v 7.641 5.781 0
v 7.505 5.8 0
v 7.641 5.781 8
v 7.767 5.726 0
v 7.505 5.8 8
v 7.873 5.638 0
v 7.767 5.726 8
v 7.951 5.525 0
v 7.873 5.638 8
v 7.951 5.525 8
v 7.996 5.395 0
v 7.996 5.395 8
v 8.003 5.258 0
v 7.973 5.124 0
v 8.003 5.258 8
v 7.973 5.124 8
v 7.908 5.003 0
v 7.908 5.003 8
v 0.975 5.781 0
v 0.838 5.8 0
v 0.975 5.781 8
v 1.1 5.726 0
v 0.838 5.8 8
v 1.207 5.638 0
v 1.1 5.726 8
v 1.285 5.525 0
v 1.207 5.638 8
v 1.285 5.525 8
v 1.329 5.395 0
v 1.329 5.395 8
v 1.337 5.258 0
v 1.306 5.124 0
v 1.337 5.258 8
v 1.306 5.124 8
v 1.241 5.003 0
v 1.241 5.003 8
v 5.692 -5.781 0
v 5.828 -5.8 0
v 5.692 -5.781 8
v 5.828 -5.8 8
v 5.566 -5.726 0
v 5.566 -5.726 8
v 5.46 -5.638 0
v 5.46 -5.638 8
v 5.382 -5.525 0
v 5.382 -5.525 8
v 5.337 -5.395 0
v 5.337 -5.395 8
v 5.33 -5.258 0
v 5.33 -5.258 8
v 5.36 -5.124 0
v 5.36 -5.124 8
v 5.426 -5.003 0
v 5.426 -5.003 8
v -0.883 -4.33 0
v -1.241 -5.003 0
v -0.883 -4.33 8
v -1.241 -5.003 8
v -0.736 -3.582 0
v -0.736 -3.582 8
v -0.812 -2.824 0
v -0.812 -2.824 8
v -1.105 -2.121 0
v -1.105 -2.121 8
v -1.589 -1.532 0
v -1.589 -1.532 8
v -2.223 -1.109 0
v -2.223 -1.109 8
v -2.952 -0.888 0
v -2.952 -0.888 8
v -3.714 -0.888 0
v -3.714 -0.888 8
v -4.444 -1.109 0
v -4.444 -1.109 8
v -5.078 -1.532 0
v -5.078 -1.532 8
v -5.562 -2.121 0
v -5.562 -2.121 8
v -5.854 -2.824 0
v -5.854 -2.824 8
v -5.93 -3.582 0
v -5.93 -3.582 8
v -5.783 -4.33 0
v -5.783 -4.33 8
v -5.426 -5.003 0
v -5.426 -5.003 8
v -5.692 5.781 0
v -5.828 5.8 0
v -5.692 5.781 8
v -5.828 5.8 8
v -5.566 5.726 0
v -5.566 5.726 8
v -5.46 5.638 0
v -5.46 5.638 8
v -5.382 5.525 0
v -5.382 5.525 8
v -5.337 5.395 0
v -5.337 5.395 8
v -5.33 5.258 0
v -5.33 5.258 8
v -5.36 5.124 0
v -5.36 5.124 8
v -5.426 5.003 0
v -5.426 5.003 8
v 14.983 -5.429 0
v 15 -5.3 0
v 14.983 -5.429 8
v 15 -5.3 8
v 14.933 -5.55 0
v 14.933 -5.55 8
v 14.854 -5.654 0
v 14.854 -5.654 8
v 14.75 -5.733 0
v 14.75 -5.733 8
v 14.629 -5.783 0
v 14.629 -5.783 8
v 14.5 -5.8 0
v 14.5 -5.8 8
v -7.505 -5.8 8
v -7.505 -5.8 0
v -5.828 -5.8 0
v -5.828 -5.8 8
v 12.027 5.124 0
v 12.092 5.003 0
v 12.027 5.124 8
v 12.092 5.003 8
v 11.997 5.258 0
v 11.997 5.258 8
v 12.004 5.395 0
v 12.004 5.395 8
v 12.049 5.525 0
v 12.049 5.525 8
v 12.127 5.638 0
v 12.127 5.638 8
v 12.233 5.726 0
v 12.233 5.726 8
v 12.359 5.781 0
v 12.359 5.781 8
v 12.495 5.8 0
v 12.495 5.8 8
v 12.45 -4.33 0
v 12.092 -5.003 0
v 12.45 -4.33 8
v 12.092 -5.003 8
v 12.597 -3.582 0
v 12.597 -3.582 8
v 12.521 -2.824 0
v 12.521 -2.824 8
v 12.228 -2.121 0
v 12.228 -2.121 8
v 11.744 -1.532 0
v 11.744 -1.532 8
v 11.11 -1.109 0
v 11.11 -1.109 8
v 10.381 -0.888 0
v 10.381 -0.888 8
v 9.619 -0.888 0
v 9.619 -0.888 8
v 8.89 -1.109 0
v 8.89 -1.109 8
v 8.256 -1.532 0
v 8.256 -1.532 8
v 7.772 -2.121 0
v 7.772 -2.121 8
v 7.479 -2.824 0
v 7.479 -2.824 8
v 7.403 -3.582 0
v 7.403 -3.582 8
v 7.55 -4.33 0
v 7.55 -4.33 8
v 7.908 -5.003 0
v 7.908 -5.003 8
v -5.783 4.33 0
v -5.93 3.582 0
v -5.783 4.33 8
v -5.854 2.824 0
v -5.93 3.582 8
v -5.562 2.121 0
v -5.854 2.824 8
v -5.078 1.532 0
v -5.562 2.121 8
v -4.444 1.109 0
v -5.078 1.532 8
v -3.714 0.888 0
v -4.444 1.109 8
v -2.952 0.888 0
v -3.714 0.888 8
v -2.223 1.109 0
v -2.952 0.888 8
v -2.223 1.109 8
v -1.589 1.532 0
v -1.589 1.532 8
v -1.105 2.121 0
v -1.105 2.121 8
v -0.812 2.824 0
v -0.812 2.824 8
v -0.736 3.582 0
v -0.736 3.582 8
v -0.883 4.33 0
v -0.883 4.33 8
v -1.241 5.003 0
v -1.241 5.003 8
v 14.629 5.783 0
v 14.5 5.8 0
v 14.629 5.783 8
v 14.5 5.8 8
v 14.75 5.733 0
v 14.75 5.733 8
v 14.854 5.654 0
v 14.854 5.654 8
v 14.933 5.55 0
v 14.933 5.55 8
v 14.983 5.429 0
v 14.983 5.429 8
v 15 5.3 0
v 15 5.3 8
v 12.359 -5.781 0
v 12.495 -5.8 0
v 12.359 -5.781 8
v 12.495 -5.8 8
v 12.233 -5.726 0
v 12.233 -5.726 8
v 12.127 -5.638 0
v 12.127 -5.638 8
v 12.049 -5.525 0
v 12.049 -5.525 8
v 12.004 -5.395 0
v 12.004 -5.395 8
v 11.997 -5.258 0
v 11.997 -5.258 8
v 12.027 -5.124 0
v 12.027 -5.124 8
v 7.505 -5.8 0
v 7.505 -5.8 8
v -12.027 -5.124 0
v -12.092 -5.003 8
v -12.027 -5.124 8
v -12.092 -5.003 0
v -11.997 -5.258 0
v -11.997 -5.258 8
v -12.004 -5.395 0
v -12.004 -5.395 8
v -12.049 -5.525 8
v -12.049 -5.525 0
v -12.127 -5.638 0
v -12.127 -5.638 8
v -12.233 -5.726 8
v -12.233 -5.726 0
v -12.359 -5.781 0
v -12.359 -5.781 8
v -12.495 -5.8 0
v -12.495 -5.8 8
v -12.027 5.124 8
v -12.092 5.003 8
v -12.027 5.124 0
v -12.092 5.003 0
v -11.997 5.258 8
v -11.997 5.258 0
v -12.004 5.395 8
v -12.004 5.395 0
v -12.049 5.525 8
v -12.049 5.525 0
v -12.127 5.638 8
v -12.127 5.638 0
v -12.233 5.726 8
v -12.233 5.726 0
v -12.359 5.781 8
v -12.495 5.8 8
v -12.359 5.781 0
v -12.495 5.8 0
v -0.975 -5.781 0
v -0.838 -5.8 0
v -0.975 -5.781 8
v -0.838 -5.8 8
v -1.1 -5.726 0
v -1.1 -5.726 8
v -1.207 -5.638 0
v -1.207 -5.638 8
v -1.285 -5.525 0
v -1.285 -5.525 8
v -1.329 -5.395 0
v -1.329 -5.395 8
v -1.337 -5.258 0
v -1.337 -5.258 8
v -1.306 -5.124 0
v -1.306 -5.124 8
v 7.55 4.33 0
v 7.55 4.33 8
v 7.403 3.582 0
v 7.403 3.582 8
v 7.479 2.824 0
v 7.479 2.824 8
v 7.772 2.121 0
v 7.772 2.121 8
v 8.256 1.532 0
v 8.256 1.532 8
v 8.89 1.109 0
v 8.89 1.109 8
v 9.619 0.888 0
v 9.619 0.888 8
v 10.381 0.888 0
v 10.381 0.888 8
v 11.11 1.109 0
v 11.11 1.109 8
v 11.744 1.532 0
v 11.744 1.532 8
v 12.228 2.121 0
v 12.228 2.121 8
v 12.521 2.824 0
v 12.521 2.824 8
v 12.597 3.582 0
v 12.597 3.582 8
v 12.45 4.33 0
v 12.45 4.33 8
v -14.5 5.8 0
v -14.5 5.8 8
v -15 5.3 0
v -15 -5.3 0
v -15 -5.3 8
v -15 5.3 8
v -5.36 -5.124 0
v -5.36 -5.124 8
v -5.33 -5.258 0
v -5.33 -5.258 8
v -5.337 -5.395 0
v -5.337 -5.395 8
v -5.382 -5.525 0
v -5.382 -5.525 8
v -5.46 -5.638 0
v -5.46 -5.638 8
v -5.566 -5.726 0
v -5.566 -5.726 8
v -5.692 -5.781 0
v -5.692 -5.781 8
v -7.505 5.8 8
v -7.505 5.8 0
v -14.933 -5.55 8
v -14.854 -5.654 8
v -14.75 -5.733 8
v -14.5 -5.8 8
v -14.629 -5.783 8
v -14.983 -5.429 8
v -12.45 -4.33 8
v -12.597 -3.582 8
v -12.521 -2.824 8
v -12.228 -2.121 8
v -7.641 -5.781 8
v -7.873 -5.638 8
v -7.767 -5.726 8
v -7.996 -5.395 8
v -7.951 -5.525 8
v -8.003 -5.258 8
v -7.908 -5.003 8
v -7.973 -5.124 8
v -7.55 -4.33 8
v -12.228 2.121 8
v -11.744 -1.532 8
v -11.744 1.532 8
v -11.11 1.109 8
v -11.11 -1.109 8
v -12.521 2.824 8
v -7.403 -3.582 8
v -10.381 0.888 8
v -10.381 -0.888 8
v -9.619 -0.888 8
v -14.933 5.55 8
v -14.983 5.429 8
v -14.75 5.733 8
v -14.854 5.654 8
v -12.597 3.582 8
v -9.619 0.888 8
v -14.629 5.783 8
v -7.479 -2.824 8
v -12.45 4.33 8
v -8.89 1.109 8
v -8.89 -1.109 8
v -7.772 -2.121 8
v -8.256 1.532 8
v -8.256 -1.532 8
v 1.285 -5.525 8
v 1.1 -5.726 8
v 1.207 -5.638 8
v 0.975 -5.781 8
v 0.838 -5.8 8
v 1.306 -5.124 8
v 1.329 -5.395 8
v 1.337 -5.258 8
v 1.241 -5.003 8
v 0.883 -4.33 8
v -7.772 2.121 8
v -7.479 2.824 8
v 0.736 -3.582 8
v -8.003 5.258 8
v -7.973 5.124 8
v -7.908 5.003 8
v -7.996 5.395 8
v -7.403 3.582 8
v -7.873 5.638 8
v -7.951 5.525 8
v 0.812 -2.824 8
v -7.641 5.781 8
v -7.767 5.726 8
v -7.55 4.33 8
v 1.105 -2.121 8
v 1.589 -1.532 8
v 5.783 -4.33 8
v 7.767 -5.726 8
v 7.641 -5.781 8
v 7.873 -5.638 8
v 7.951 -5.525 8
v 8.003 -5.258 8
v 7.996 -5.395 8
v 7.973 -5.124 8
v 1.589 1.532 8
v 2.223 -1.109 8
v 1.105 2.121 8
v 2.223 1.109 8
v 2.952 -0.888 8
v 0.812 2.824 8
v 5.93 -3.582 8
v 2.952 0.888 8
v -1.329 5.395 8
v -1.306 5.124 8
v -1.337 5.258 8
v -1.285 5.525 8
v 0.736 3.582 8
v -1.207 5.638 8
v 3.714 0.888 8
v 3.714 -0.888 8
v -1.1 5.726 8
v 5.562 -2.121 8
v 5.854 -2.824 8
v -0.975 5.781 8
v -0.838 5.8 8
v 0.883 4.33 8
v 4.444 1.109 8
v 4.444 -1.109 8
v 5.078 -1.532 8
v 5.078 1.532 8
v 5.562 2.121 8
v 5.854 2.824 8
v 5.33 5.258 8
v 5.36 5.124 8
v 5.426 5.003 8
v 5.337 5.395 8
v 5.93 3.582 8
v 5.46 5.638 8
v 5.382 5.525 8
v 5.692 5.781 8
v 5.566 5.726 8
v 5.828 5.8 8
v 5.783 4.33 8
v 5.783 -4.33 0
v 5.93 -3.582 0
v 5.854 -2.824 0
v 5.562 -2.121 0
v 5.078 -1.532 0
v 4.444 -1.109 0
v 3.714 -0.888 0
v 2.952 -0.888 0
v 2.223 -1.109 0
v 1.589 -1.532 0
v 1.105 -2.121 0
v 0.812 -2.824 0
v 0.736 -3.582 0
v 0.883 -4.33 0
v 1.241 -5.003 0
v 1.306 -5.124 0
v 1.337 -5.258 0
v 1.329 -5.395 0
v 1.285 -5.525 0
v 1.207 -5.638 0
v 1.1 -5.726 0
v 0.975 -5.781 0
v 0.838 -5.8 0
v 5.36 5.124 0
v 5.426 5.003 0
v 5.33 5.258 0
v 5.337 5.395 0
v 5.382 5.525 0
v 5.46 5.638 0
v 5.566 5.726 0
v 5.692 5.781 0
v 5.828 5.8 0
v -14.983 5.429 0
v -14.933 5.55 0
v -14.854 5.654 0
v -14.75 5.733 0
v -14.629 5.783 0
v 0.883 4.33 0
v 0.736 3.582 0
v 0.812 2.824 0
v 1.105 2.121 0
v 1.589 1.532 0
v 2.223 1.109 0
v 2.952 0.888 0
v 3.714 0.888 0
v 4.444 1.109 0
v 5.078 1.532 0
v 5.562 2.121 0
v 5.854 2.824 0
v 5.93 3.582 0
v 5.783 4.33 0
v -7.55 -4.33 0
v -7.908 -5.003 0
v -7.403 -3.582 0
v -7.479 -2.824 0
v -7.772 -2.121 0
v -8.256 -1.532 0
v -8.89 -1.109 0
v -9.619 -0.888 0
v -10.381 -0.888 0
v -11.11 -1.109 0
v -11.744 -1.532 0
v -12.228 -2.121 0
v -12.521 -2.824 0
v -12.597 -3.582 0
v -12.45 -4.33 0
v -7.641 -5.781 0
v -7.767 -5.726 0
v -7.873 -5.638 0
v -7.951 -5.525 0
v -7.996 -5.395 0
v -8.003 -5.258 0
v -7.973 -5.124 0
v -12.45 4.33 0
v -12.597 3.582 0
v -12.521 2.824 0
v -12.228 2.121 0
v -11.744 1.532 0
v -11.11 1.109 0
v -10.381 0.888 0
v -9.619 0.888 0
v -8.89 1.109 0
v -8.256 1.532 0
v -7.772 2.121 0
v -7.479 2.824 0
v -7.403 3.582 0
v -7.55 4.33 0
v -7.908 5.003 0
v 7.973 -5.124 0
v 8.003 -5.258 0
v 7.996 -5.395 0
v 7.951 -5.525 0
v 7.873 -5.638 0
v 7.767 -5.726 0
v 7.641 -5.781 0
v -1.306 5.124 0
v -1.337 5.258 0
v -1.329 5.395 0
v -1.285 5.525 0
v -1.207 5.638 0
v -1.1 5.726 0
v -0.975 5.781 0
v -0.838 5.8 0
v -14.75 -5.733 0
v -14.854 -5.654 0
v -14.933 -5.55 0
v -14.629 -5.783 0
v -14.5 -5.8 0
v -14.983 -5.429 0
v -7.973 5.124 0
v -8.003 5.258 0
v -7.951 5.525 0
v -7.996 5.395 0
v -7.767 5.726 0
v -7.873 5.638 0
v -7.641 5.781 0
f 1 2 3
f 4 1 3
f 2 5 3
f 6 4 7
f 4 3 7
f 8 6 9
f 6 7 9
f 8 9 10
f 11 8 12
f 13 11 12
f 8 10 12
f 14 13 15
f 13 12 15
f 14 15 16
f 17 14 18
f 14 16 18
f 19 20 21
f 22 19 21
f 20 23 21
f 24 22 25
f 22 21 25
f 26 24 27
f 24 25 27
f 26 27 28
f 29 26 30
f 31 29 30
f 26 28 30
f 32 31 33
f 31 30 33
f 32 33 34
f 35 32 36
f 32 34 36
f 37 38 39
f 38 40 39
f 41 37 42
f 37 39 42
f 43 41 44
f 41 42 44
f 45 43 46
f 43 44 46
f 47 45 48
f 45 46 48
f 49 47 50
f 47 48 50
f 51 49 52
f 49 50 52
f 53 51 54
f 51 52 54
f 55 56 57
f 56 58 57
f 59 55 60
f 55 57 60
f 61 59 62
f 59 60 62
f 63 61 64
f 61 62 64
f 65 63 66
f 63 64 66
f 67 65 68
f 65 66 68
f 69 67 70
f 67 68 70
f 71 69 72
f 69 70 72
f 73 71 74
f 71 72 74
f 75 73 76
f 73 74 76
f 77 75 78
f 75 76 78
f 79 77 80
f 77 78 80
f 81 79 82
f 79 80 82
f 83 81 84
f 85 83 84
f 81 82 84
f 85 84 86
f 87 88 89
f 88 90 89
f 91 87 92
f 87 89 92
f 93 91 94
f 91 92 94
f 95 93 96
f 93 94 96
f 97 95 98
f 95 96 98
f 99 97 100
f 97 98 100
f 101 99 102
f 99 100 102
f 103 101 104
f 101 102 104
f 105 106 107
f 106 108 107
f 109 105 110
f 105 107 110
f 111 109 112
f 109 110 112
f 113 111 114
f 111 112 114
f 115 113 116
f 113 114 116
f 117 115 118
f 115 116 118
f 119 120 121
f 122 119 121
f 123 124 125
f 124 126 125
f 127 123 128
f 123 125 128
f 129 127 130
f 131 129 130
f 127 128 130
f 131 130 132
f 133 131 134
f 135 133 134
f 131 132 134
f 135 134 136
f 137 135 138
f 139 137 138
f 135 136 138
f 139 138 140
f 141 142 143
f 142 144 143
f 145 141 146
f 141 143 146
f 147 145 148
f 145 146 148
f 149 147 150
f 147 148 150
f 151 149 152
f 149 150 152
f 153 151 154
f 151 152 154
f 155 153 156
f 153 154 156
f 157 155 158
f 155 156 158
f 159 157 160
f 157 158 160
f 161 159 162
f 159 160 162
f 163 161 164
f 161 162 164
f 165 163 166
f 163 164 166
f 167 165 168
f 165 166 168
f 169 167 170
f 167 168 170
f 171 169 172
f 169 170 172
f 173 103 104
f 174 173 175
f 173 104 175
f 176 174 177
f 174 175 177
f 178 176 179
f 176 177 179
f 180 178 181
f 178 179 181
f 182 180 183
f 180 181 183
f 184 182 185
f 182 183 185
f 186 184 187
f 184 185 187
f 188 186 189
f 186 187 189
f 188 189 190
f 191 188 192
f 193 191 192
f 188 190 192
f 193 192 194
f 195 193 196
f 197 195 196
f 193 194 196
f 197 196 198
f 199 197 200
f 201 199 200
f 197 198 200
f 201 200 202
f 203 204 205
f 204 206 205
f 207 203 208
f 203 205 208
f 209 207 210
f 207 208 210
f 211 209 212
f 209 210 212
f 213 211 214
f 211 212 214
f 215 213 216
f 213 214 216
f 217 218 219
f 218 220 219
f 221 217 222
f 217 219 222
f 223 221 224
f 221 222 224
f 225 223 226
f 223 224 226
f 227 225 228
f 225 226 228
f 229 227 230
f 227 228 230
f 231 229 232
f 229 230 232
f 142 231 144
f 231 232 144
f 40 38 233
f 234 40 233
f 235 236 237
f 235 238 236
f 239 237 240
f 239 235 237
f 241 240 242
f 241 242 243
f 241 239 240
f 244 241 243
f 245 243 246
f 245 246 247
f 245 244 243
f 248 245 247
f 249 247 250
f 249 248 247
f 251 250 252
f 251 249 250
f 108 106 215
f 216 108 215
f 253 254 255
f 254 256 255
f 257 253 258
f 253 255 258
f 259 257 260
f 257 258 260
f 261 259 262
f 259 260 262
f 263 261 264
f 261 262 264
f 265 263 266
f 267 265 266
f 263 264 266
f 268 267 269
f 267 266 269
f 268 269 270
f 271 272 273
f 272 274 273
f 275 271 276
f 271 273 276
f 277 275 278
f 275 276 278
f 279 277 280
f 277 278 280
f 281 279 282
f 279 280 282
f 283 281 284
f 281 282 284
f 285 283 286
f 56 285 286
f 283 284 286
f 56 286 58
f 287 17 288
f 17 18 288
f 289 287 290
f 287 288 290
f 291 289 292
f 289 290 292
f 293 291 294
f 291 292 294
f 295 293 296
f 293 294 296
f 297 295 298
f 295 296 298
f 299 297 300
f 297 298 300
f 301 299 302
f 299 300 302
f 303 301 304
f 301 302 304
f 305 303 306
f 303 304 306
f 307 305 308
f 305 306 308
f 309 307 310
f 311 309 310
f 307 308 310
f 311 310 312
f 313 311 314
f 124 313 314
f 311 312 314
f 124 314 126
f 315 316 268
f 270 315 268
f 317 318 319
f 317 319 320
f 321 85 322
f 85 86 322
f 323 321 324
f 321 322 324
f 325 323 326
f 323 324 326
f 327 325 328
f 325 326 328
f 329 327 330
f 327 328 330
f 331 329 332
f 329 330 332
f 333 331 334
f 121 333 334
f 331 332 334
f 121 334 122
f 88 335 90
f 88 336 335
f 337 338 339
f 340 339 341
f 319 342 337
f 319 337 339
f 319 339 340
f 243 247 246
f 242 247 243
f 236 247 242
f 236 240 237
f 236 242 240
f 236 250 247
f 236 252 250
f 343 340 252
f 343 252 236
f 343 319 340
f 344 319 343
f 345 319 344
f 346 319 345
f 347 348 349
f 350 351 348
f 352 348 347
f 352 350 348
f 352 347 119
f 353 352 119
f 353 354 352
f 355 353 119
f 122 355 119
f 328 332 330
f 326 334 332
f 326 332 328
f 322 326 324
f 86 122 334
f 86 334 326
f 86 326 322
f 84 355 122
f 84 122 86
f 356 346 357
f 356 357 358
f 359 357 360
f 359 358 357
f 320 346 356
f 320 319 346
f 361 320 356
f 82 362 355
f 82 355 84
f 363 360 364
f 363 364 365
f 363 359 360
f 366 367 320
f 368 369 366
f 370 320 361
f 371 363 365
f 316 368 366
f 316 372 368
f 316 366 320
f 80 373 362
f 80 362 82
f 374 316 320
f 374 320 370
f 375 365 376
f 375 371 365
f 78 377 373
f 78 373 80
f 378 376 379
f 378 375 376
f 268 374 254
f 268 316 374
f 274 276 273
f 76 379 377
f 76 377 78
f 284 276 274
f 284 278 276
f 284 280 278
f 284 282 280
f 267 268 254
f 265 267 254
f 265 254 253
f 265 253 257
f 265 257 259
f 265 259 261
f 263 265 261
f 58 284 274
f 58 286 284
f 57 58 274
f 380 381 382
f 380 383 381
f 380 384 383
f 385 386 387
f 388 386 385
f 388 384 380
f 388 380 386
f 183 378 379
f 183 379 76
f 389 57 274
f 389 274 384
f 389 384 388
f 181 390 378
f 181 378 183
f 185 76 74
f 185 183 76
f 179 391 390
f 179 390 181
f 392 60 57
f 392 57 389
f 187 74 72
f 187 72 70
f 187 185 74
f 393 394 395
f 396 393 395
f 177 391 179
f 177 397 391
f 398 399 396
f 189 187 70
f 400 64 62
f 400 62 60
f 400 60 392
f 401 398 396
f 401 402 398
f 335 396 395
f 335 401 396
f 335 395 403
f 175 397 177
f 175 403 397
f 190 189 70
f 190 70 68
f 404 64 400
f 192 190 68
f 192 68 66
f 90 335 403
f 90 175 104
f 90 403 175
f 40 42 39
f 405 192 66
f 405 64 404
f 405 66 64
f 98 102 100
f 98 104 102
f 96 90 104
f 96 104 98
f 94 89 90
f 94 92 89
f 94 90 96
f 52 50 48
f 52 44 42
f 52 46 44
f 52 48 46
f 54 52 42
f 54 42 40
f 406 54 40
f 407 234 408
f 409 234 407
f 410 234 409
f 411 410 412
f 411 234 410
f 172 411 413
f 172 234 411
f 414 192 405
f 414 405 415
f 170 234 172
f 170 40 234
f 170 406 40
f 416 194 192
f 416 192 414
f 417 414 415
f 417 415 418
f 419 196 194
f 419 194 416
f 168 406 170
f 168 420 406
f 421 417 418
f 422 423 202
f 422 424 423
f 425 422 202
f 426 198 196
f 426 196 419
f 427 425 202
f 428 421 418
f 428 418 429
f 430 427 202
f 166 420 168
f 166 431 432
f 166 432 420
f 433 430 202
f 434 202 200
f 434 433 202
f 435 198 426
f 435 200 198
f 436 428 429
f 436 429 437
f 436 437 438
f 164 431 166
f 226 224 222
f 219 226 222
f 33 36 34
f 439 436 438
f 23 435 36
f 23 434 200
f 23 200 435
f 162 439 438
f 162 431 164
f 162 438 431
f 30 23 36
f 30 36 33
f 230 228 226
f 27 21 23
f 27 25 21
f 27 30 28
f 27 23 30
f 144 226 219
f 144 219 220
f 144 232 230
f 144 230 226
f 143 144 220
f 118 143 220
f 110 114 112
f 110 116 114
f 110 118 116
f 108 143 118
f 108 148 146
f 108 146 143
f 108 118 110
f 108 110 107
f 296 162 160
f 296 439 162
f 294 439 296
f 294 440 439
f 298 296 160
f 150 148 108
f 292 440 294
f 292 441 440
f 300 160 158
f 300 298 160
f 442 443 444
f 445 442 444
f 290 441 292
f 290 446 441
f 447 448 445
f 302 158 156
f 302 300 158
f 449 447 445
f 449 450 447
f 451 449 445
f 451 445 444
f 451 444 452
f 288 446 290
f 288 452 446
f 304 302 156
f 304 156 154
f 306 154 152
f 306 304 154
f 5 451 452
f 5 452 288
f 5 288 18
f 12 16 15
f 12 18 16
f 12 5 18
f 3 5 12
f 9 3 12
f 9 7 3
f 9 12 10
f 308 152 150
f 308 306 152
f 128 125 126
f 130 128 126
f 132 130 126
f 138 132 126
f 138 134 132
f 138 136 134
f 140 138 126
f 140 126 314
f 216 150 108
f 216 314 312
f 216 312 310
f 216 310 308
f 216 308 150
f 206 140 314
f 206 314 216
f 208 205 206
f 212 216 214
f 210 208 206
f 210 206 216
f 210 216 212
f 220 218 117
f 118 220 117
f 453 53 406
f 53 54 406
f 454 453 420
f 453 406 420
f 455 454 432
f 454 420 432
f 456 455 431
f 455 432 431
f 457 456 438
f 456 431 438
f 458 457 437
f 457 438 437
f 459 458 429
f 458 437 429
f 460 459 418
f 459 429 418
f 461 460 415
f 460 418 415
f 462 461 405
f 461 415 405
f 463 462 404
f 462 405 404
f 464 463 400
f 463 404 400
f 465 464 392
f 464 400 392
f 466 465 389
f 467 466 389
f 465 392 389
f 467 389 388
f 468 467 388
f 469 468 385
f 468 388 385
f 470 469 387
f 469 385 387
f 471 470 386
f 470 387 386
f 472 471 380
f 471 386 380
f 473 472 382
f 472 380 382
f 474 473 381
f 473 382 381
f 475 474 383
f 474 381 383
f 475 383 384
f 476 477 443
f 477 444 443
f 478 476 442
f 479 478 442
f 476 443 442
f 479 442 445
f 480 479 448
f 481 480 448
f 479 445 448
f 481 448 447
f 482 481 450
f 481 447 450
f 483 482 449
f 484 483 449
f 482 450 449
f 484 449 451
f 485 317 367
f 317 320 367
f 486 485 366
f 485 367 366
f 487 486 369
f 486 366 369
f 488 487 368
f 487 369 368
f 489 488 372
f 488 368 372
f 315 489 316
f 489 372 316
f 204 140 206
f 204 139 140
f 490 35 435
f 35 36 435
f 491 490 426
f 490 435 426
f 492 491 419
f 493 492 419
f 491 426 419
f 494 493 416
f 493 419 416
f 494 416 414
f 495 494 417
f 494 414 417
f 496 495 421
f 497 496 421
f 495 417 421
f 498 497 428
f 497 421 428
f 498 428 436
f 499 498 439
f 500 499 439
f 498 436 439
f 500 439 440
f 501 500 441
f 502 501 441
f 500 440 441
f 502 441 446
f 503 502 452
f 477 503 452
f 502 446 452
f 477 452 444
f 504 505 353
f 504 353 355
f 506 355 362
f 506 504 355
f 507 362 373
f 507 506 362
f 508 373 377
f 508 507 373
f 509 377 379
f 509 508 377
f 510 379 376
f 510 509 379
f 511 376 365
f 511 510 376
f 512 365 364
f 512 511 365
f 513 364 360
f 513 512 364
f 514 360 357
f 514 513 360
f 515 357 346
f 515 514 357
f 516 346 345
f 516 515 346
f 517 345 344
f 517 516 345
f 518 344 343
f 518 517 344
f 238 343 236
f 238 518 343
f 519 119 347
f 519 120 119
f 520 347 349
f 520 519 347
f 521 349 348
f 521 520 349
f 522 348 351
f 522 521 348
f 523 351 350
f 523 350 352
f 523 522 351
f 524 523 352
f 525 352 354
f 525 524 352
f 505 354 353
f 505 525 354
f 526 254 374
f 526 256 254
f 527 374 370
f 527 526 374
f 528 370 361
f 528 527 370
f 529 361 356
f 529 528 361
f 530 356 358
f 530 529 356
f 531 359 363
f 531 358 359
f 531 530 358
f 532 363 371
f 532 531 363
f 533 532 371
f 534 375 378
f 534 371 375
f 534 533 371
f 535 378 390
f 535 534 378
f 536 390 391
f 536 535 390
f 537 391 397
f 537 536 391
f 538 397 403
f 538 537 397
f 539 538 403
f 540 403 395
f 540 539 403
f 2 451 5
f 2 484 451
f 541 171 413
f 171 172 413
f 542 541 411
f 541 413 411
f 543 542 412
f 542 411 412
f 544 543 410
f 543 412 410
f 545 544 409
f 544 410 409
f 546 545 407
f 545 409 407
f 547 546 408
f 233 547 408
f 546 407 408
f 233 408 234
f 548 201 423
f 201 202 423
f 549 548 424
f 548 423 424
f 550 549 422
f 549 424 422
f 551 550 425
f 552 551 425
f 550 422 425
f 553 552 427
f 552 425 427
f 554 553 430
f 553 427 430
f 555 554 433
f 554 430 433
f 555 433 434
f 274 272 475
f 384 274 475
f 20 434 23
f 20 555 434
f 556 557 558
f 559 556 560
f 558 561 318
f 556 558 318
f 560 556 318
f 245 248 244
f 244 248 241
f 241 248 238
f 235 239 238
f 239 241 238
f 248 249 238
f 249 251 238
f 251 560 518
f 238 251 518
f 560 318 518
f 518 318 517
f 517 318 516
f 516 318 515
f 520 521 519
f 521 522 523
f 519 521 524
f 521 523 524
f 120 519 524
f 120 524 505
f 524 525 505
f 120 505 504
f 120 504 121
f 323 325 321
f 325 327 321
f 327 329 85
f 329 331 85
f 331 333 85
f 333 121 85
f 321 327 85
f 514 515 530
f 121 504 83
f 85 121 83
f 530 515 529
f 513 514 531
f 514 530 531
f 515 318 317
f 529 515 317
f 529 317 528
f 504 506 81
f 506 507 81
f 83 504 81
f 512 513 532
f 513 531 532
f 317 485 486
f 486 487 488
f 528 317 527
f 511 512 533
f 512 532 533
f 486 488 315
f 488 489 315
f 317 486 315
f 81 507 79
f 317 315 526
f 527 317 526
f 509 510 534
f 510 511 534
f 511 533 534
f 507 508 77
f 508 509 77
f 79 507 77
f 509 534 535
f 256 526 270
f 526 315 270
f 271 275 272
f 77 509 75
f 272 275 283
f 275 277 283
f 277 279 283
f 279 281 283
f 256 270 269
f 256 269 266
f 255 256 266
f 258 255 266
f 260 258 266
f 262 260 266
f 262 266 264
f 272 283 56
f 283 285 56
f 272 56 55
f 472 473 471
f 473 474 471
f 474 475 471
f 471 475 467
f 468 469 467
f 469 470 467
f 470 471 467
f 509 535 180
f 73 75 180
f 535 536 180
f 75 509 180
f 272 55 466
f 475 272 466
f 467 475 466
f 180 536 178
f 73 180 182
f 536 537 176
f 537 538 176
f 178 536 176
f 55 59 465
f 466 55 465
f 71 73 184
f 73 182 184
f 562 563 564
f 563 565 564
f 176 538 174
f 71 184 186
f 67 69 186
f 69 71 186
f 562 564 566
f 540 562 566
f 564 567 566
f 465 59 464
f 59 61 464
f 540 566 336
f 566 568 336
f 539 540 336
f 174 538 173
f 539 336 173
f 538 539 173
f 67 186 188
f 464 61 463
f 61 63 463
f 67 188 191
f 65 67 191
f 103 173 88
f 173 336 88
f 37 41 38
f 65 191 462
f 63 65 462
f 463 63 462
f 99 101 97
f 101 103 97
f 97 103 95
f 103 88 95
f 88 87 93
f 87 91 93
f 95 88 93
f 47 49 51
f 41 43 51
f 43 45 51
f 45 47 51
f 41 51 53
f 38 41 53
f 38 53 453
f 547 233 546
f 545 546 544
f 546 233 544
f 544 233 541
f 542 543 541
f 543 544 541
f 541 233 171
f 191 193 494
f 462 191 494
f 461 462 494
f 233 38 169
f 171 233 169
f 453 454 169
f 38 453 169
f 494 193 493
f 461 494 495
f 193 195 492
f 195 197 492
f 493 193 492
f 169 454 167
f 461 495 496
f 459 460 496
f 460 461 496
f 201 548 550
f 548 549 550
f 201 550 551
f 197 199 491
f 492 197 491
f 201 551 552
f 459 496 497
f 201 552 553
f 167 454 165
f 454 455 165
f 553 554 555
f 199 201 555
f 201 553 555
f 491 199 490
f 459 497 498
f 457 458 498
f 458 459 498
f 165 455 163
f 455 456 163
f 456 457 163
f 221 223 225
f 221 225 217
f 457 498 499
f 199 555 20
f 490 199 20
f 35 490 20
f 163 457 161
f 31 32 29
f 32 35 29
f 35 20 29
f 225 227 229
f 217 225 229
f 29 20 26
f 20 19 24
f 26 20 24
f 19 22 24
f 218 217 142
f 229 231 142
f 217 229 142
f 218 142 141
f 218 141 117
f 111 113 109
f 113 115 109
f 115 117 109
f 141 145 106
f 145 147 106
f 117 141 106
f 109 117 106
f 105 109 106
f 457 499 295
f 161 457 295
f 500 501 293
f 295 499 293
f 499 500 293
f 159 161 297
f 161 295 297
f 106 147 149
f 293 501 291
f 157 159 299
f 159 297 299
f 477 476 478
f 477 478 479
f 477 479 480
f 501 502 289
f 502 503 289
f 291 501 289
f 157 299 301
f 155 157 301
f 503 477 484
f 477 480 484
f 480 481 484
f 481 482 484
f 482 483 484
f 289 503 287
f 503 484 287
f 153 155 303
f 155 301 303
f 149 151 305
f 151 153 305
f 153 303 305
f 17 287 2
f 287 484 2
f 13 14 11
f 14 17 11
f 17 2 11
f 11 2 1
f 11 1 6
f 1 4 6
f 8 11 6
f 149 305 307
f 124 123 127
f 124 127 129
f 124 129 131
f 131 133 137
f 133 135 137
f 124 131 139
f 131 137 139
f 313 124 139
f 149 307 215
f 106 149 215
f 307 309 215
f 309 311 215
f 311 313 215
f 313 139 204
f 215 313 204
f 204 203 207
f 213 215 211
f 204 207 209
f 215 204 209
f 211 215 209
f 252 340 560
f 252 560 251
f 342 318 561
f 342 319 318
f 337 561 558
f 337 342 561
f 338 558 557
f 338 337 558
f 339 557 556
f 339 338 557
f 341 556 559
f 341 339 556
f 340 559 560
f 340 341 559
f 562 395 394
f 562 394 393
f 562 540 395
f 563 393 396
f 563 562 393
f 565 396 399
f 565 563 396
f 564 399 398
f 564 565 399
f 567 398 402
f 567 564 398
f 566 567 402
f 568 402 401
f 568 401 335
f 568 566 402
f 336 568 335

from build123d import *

# Parameters (mm, degrees)
SKETCH_W            = 30
SKETCH_H            = 11.6
PAD_DEPTH           = 8
SKETCH001_R         = 2.6
POCKET_DEPTH        = 0.001
POCKET_DEPTH_BACK   = 8.001
LINEARPATTERN_COUNT = 4
LINEARPATTERN_PITCH = 6.666667
PARTDESIGN_FILLET_R = 0.5


with BuildPart() as part:
    # Sketch → Pad (new body)
    with BuildSketch(Plane.XY):
        Rectangle(SKETCH_W, SKETCH_H)
    extrude(amount=PAD_DEPTH)

    # Sketch001 → Pocket (cut, two sides)
    with BuildSketch(Plane.XY) as pocket_sk:
        with Locations((-10, 3.46)):
            Circle(SKETCH001_R)
        with Locations((-10, -3.46)):
            Circle(SKETCH001_R)
    pocket = extrude(amount=-POCKET_DEPTH, mode=Mode.SUBTRACT) + extrude(pocket_sk.sketch, amount=POCKET_DEPTH_BACK, mode=Mode.SUBTRACT)

    # LinearPattern: Pocket ×4
    with Locations(*[(i * LINEARPATTERN_PITCH, 0, 0) for i in range(1, LINEARPATTERN_COUNT)]):
        add(pocket, mode=Mode.SUBTRACT)

    # PartDesign__Fillet
    partdesign_fillet_edges = [part.edges().sort_by_distance(p)[0] for p in [
        (-15, -5.8, 4),
        (-15, 5.8, 4),
        (-11.133314, -5.8, 4),
        (-11.133314, 5.8, 4),
        (-7.4, -3.46, 4),
        (-7.4, 3.46, 4),
        (-8.866686, 5.8, 4),
        (-4.466647, 5.8, 4),
        (-0.733333, 3.46, 4),
        (-2.20002, 5.8, 4),
        (2.20002, 5.8, 4),
        (5.933333, 3.46, 4),
        (4.466647, 5.8, 4),
        (8.866686, 5.8, 4),
        (12.6, 3.46, 4),
        (11.133314, 5.8, 4),
        (15, 5.8, 4),
        (15, -5.8, 4),
        (11.133314, -5.8, 4),
        (12.6, -3.46, 4),
        (8.866686, -5.8, 4),
        (4.466647, -5.8, 4),
        (5.933333, -3.46, 4),
        (2.20002, -5.8, 4),
        (-2.20002, -5.8, 4),
        (-0.733333, -3.46, 4),
        (-4.466647, -5.8, 4),
        (-8.866686, -5.8, 4),
    ]]
    fillet(partdesign_fillet_edges, radius=PARTDESIGN_FILLET_R)


solid = part.part
